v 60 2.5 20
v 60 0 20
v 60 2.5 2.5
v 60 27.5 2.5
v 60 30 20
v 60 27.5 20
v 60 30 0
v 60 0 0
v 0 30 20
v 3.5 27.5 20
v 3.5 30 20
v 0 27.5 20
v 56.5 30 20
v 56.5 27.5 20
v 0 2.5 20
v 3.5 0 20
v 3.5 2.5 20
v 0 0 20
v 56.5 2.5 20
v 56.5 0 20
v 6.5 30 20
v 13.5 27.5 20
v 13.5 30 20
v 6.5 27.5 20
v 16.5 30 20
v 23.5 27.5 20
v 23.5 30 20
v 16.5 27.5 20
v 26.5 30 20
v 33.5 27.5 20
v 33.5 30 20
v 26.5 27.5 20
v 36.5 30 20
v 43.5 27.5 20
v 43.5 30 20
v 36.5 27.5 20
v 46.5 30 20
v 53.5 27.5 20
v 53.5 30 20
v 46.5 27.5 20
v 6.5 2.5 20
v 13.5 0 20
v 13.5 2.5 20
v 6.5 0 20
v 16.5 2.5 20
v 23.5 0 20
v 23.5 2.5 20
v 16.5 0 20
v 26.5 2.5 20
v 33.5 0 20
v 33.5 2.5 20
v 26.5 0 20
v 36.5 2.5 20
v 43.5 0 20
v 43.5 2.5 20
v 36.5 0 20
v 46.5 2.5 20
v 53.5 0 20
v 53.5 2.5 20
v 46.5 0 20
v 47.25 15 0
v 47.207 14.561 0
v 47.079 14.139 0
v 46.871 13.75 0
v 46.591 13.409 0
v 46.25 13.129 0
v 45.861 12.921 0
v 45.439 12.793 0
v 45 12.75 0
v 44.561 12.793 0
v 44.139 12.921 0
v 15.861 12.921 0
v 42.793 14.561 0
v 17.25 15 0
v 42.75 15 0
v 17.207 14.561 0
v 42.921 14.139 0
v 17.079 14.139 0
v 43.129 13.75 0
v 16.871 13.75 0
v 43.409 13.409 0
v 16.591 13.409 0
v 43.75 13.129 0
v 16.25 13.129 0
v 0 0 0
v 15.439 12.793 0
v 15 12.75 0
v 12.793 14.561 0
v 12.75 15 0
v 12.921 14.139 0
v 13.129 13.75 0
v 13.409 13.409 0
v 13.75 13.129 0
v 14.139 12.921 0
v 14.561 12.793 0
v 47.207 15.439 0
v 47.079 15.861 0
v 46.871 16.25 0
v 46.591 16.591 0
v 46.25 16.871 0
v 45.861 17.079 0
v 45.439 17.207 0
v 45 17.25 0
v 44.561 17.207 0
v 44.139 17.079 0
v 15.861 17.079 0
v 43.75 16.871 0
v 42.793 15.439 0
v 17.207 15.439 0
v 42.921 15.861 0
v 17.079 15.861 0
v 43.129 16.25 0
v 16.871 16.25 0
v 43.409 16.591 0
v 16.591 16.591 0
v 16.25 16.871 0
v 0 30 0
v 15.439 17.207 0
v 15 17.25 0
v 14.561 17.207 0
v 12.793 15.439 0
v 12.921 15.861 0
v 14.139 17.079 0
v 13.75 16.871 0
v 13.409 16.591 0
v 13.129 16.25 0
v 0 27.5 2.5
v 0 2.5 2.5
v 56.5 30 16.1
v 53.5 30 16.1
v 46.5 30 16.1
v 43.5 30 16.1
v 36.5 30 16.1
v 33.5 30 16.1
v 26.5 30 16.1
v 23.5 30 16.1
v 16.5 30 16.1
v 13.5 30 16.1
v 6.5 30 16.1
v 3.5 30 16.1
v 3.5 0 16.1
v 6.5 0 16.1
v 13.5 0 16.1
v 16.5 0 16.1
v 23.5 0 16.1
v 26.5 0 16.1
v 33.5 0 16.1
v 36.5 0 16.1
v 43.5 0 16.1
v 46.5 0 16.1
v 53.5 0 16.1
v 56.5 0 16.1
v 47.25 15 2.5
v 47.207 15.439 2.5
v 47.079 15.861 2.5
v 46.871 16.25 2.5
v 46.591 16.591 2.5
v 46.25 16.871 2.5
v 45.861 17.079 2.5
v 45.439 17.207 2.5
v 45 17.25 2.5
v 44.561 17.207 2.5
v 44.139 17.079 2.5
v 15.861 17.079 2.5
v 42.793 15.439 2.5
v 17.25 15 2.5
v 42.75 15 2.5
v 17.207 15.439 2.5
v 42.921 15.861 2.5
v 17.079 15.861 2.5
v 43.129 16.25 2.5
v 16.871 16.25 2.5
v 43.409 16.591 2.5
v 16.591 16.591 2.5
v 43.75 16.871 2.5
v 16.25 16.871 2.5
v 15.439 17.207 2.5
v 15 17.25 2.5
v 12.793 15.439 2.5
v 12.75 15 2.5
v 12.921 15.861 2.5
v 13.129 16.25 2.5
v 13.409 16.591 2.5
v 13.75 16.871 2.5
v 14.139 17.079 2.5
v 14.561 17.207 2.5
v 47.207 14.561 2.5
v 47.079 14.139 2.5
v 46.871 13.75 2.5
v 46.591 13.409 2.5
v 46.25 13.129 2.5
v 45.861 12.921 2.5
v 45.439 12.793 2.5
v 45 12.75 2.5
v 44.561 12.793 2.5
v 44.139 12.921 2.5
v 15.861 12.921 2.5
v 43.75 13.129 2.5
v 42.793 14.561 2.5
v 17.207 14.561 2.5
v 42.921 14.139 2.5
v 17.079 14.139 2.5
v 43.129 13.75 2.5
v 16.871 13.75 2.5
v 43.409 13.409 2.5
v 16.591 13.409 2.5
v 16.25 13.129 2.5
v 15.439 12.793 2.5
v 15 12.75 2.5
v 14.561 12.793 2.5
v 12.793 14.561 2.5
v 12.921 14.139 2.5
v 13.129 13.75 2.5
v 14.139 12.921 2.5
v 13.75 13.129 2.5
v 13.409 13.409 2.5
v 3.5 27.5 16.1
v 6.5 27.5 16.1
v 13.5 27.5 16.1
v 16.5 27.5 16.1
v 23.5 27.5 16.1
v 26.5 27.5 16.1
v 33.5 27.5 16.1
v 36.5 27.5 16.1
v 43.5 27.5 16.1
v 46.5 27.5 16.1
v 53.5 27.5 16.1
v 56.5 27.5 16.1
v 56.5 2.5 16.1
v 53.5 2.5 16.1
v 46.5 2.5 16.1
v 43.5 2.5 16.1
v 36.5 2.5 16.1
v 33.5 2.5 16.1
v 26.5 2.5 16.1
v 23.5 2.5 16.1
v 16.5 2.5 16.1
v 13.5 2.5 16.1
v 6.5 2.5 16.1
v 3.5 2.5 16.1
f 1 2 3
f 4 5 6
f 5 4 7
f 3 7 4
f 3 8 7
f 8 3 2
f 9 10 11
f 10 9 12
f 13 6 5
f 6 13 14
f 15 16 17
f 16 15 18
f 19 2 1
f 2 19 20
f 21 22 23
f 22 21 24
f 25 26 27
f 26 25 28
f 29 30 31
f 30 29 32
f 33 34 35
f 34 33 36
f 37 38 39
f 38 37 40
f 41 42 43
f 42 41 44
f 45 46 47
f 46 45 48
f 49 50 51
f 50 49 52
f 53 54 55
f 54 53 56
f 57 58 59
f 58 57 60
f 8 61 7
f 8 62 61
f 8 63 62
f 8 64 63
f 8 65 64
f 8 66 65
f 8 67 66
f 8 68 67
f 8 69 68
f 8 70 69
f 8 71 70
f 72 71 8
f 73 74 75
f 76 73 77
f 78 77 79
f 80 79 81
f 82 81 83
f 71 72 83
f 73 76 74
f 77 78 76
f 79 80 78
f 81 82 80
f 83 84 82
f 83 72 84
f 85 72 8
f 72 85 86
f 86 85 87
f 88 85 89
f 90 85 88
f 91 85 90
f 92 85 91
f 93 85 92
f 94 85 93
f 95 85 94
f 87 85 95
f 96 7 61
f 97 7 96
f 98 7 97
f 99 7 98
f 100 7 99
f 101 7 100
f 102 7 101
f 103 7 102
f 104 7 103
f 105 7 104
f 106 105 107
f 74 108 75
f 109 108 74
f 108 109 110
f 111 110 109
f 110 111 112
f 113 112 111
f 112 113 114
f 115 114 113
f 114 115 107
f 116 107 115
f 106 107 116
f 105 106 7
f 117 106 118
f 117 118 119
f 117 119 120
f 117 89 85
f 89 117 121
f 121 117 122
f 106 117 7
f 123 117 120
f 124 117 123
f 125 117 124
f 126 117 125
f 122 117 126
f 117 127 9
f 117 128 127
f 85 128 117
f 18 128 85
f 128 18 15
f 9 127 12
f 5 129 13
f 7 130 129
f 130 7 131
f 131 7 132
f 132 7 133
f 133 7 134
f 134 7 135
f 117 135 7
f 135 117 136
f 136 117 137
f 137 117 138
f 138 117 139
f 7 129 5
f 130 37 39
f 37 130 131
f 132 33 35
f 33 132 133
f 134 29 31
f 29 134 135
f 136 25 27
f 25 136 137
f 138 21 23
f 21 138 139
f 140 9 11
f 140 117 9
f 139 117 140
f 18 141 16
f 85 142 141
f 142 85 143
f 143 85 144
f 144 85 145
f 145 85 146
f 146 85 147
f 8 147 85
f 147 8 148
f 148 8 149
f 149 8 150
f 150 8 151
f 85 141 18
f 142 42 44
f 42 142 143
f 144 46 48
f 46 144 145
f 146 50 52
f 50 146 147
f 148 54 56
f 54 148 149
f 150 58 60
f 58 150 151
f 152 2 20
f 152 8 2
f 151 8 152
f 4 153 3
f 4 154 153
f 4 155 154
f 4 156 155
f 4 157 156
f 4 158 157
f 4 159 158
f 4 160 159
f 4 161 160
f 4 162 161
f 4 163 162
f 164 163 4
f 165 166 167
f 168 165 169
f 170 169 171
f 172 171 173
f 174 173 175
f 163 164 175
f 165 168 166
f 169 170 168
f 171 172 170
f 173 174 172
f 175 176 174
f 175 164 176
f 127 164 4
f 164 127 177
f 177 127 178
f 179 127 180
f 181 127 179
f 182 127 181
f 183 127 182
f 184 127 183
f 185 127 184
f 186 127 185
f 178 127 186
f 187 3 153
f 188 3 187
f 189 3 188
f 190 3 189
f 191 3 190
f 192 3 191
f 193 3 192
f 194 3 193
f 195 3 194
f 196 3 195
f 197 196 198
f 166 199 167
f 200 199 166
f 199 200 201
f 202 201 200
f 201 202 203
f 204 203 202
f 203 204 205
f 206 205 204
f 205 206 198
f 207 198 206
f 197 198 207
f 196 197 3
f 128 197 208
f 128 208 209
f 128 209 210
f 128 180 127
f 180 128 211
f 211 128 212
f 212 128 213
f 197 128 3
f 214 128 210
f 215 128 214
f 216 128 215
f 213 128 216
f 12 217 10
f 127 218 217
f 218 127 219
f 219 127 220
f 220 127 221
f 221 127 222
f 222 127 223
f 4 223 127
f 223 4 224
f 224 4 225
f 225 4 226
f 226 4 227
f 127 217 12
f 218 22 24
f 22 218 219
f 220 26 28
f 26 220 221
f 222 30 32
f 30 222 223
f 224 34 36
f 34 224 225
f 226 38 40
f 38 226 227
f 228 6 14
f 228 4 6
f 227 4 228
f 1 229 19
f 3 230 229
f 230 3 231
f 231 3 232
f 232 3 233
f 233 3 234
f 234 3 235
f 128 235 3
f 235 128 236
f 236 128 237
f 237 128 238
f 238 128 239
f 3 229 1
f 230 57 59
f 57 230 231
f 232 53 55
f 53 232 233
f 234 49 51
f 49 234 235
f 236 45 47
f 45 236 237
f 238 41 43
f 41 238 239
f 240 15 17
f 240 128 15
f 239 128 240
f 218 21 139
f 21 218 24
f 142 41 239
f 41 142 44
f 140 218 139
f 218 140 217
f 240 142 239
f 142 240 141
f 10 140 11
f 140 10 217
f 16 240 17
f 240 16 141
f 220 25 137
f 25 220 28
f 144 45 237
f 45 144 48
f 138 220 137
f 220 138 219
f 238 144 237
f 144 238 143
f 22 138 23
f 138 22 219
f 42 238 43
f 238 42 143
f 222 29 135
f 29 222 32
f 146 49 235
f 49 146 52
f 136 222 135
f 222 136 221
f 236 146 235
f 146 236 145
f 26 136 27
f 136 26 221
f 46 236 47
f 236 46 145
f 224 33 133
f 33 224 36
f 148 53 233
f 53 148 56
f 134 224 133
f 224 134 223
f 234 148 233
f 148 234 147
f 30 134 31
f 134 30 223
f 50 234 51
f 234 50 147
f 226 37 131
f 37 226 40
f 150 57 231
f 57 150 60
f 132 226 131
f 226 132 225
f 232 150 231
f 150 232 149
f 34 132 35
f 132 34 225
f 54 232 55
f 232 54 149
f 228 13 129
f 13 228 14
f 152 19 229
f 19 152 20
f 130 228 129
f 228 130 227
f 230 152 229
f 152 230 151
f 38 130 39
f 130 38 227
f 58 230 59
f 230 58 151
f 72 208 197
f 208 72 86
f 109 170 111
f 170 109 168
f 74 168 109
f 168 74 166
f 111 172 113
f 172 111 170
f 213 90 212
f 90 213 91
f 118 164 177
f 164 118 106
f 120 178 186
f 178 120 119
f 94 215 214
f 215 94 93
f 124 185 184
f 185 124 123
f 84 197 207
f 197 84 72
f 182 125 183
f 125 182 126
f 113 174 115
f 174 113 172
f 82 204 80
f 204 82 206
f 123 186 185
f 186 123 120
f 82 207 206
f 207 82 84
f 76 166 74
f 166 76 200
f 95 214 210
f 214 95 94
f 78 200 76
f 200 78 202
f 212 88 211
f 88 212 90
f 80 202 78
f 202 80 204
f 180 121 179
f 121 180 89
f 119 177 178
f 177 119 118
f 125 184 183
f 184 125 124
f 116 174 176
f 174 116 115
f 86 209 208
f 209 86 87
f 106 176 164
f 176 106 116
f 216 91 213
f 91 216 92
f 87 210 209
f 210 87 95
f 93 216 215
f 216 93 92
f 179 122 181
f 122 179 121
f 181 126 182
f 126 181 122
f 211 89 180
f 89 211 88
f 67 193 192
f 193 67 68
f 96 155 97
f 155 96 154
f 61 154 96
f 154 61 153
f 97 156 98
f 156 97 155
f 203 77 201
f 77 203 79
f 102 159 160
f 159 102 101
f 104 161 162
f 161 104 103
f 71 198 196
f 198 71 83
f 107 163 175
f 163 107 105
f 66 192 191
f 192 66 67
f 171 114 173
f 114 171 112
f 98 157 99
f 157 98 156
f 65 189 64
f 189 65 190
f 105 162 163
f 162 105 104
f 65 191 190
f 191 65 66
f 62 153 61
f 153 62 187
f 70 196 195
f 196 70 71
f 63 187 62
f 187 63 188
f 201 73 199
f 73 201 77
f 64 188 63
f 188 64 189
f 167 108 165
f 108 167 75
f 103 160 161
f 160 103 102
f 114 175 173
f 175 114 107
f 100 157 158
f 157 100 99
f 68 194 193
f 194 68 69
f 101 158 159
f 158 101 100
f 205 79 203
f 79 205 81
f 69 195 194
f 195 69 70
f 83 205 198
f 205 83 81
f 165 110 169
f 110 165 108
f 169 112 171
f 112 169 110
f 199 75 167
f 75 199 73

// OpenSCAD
$fn = 32;

// ----------------------------------------------------------------------
// Cable duct: 60 x 30 x 20 mm, 6 fingers
// ----------------------------------------------------------------------

// --- parameters (mm) ---
duct_len = 60;            // duct length, X
duct_w = 30;              // duct width, Y
duct_h = 20;              // duct height, Z
wall_t = 2.5;             // side wall thickness
floor_t = 2.5;            // floor thickness
slot_w = 3;               // finger slot width
slot_h = 13.6;            // finger slot height
fingers = 6;              // number of finger slots per side
pitch = 10;               // finger pitch
hole_d = 4.5;             // floor mounting hole
hole_n = 2;               // mounting holes in the floor

module shell() {
  difference() {
    cube([duct_len, duct_w, duct_h]);
    /* open top channel */
    translate([-wall_t - 1, wall_t, floor_t])
      cube([duct_len + 2 * wall_t + 2, duct_w - 2 * wall_t, duct_h + 1]);
  }
}

difference() {
  union() {
    shell();
  }
  /* finger slots cut through both side walls */
  for (i = [0 : fingers - 1]) translate([pitch / 2 + i * pitch - slot_w / 2, -1, floor_t + slot_h]) cube([slot_w, duct_w + 2, duct_h]);
  for (i = [0 : hole_n - 1]) translate([(duct_len / hole_n) * (i + 0.5), duct_w / 2, -1]) cylinder(h = floor_t + 2, d = hole_d);
}
